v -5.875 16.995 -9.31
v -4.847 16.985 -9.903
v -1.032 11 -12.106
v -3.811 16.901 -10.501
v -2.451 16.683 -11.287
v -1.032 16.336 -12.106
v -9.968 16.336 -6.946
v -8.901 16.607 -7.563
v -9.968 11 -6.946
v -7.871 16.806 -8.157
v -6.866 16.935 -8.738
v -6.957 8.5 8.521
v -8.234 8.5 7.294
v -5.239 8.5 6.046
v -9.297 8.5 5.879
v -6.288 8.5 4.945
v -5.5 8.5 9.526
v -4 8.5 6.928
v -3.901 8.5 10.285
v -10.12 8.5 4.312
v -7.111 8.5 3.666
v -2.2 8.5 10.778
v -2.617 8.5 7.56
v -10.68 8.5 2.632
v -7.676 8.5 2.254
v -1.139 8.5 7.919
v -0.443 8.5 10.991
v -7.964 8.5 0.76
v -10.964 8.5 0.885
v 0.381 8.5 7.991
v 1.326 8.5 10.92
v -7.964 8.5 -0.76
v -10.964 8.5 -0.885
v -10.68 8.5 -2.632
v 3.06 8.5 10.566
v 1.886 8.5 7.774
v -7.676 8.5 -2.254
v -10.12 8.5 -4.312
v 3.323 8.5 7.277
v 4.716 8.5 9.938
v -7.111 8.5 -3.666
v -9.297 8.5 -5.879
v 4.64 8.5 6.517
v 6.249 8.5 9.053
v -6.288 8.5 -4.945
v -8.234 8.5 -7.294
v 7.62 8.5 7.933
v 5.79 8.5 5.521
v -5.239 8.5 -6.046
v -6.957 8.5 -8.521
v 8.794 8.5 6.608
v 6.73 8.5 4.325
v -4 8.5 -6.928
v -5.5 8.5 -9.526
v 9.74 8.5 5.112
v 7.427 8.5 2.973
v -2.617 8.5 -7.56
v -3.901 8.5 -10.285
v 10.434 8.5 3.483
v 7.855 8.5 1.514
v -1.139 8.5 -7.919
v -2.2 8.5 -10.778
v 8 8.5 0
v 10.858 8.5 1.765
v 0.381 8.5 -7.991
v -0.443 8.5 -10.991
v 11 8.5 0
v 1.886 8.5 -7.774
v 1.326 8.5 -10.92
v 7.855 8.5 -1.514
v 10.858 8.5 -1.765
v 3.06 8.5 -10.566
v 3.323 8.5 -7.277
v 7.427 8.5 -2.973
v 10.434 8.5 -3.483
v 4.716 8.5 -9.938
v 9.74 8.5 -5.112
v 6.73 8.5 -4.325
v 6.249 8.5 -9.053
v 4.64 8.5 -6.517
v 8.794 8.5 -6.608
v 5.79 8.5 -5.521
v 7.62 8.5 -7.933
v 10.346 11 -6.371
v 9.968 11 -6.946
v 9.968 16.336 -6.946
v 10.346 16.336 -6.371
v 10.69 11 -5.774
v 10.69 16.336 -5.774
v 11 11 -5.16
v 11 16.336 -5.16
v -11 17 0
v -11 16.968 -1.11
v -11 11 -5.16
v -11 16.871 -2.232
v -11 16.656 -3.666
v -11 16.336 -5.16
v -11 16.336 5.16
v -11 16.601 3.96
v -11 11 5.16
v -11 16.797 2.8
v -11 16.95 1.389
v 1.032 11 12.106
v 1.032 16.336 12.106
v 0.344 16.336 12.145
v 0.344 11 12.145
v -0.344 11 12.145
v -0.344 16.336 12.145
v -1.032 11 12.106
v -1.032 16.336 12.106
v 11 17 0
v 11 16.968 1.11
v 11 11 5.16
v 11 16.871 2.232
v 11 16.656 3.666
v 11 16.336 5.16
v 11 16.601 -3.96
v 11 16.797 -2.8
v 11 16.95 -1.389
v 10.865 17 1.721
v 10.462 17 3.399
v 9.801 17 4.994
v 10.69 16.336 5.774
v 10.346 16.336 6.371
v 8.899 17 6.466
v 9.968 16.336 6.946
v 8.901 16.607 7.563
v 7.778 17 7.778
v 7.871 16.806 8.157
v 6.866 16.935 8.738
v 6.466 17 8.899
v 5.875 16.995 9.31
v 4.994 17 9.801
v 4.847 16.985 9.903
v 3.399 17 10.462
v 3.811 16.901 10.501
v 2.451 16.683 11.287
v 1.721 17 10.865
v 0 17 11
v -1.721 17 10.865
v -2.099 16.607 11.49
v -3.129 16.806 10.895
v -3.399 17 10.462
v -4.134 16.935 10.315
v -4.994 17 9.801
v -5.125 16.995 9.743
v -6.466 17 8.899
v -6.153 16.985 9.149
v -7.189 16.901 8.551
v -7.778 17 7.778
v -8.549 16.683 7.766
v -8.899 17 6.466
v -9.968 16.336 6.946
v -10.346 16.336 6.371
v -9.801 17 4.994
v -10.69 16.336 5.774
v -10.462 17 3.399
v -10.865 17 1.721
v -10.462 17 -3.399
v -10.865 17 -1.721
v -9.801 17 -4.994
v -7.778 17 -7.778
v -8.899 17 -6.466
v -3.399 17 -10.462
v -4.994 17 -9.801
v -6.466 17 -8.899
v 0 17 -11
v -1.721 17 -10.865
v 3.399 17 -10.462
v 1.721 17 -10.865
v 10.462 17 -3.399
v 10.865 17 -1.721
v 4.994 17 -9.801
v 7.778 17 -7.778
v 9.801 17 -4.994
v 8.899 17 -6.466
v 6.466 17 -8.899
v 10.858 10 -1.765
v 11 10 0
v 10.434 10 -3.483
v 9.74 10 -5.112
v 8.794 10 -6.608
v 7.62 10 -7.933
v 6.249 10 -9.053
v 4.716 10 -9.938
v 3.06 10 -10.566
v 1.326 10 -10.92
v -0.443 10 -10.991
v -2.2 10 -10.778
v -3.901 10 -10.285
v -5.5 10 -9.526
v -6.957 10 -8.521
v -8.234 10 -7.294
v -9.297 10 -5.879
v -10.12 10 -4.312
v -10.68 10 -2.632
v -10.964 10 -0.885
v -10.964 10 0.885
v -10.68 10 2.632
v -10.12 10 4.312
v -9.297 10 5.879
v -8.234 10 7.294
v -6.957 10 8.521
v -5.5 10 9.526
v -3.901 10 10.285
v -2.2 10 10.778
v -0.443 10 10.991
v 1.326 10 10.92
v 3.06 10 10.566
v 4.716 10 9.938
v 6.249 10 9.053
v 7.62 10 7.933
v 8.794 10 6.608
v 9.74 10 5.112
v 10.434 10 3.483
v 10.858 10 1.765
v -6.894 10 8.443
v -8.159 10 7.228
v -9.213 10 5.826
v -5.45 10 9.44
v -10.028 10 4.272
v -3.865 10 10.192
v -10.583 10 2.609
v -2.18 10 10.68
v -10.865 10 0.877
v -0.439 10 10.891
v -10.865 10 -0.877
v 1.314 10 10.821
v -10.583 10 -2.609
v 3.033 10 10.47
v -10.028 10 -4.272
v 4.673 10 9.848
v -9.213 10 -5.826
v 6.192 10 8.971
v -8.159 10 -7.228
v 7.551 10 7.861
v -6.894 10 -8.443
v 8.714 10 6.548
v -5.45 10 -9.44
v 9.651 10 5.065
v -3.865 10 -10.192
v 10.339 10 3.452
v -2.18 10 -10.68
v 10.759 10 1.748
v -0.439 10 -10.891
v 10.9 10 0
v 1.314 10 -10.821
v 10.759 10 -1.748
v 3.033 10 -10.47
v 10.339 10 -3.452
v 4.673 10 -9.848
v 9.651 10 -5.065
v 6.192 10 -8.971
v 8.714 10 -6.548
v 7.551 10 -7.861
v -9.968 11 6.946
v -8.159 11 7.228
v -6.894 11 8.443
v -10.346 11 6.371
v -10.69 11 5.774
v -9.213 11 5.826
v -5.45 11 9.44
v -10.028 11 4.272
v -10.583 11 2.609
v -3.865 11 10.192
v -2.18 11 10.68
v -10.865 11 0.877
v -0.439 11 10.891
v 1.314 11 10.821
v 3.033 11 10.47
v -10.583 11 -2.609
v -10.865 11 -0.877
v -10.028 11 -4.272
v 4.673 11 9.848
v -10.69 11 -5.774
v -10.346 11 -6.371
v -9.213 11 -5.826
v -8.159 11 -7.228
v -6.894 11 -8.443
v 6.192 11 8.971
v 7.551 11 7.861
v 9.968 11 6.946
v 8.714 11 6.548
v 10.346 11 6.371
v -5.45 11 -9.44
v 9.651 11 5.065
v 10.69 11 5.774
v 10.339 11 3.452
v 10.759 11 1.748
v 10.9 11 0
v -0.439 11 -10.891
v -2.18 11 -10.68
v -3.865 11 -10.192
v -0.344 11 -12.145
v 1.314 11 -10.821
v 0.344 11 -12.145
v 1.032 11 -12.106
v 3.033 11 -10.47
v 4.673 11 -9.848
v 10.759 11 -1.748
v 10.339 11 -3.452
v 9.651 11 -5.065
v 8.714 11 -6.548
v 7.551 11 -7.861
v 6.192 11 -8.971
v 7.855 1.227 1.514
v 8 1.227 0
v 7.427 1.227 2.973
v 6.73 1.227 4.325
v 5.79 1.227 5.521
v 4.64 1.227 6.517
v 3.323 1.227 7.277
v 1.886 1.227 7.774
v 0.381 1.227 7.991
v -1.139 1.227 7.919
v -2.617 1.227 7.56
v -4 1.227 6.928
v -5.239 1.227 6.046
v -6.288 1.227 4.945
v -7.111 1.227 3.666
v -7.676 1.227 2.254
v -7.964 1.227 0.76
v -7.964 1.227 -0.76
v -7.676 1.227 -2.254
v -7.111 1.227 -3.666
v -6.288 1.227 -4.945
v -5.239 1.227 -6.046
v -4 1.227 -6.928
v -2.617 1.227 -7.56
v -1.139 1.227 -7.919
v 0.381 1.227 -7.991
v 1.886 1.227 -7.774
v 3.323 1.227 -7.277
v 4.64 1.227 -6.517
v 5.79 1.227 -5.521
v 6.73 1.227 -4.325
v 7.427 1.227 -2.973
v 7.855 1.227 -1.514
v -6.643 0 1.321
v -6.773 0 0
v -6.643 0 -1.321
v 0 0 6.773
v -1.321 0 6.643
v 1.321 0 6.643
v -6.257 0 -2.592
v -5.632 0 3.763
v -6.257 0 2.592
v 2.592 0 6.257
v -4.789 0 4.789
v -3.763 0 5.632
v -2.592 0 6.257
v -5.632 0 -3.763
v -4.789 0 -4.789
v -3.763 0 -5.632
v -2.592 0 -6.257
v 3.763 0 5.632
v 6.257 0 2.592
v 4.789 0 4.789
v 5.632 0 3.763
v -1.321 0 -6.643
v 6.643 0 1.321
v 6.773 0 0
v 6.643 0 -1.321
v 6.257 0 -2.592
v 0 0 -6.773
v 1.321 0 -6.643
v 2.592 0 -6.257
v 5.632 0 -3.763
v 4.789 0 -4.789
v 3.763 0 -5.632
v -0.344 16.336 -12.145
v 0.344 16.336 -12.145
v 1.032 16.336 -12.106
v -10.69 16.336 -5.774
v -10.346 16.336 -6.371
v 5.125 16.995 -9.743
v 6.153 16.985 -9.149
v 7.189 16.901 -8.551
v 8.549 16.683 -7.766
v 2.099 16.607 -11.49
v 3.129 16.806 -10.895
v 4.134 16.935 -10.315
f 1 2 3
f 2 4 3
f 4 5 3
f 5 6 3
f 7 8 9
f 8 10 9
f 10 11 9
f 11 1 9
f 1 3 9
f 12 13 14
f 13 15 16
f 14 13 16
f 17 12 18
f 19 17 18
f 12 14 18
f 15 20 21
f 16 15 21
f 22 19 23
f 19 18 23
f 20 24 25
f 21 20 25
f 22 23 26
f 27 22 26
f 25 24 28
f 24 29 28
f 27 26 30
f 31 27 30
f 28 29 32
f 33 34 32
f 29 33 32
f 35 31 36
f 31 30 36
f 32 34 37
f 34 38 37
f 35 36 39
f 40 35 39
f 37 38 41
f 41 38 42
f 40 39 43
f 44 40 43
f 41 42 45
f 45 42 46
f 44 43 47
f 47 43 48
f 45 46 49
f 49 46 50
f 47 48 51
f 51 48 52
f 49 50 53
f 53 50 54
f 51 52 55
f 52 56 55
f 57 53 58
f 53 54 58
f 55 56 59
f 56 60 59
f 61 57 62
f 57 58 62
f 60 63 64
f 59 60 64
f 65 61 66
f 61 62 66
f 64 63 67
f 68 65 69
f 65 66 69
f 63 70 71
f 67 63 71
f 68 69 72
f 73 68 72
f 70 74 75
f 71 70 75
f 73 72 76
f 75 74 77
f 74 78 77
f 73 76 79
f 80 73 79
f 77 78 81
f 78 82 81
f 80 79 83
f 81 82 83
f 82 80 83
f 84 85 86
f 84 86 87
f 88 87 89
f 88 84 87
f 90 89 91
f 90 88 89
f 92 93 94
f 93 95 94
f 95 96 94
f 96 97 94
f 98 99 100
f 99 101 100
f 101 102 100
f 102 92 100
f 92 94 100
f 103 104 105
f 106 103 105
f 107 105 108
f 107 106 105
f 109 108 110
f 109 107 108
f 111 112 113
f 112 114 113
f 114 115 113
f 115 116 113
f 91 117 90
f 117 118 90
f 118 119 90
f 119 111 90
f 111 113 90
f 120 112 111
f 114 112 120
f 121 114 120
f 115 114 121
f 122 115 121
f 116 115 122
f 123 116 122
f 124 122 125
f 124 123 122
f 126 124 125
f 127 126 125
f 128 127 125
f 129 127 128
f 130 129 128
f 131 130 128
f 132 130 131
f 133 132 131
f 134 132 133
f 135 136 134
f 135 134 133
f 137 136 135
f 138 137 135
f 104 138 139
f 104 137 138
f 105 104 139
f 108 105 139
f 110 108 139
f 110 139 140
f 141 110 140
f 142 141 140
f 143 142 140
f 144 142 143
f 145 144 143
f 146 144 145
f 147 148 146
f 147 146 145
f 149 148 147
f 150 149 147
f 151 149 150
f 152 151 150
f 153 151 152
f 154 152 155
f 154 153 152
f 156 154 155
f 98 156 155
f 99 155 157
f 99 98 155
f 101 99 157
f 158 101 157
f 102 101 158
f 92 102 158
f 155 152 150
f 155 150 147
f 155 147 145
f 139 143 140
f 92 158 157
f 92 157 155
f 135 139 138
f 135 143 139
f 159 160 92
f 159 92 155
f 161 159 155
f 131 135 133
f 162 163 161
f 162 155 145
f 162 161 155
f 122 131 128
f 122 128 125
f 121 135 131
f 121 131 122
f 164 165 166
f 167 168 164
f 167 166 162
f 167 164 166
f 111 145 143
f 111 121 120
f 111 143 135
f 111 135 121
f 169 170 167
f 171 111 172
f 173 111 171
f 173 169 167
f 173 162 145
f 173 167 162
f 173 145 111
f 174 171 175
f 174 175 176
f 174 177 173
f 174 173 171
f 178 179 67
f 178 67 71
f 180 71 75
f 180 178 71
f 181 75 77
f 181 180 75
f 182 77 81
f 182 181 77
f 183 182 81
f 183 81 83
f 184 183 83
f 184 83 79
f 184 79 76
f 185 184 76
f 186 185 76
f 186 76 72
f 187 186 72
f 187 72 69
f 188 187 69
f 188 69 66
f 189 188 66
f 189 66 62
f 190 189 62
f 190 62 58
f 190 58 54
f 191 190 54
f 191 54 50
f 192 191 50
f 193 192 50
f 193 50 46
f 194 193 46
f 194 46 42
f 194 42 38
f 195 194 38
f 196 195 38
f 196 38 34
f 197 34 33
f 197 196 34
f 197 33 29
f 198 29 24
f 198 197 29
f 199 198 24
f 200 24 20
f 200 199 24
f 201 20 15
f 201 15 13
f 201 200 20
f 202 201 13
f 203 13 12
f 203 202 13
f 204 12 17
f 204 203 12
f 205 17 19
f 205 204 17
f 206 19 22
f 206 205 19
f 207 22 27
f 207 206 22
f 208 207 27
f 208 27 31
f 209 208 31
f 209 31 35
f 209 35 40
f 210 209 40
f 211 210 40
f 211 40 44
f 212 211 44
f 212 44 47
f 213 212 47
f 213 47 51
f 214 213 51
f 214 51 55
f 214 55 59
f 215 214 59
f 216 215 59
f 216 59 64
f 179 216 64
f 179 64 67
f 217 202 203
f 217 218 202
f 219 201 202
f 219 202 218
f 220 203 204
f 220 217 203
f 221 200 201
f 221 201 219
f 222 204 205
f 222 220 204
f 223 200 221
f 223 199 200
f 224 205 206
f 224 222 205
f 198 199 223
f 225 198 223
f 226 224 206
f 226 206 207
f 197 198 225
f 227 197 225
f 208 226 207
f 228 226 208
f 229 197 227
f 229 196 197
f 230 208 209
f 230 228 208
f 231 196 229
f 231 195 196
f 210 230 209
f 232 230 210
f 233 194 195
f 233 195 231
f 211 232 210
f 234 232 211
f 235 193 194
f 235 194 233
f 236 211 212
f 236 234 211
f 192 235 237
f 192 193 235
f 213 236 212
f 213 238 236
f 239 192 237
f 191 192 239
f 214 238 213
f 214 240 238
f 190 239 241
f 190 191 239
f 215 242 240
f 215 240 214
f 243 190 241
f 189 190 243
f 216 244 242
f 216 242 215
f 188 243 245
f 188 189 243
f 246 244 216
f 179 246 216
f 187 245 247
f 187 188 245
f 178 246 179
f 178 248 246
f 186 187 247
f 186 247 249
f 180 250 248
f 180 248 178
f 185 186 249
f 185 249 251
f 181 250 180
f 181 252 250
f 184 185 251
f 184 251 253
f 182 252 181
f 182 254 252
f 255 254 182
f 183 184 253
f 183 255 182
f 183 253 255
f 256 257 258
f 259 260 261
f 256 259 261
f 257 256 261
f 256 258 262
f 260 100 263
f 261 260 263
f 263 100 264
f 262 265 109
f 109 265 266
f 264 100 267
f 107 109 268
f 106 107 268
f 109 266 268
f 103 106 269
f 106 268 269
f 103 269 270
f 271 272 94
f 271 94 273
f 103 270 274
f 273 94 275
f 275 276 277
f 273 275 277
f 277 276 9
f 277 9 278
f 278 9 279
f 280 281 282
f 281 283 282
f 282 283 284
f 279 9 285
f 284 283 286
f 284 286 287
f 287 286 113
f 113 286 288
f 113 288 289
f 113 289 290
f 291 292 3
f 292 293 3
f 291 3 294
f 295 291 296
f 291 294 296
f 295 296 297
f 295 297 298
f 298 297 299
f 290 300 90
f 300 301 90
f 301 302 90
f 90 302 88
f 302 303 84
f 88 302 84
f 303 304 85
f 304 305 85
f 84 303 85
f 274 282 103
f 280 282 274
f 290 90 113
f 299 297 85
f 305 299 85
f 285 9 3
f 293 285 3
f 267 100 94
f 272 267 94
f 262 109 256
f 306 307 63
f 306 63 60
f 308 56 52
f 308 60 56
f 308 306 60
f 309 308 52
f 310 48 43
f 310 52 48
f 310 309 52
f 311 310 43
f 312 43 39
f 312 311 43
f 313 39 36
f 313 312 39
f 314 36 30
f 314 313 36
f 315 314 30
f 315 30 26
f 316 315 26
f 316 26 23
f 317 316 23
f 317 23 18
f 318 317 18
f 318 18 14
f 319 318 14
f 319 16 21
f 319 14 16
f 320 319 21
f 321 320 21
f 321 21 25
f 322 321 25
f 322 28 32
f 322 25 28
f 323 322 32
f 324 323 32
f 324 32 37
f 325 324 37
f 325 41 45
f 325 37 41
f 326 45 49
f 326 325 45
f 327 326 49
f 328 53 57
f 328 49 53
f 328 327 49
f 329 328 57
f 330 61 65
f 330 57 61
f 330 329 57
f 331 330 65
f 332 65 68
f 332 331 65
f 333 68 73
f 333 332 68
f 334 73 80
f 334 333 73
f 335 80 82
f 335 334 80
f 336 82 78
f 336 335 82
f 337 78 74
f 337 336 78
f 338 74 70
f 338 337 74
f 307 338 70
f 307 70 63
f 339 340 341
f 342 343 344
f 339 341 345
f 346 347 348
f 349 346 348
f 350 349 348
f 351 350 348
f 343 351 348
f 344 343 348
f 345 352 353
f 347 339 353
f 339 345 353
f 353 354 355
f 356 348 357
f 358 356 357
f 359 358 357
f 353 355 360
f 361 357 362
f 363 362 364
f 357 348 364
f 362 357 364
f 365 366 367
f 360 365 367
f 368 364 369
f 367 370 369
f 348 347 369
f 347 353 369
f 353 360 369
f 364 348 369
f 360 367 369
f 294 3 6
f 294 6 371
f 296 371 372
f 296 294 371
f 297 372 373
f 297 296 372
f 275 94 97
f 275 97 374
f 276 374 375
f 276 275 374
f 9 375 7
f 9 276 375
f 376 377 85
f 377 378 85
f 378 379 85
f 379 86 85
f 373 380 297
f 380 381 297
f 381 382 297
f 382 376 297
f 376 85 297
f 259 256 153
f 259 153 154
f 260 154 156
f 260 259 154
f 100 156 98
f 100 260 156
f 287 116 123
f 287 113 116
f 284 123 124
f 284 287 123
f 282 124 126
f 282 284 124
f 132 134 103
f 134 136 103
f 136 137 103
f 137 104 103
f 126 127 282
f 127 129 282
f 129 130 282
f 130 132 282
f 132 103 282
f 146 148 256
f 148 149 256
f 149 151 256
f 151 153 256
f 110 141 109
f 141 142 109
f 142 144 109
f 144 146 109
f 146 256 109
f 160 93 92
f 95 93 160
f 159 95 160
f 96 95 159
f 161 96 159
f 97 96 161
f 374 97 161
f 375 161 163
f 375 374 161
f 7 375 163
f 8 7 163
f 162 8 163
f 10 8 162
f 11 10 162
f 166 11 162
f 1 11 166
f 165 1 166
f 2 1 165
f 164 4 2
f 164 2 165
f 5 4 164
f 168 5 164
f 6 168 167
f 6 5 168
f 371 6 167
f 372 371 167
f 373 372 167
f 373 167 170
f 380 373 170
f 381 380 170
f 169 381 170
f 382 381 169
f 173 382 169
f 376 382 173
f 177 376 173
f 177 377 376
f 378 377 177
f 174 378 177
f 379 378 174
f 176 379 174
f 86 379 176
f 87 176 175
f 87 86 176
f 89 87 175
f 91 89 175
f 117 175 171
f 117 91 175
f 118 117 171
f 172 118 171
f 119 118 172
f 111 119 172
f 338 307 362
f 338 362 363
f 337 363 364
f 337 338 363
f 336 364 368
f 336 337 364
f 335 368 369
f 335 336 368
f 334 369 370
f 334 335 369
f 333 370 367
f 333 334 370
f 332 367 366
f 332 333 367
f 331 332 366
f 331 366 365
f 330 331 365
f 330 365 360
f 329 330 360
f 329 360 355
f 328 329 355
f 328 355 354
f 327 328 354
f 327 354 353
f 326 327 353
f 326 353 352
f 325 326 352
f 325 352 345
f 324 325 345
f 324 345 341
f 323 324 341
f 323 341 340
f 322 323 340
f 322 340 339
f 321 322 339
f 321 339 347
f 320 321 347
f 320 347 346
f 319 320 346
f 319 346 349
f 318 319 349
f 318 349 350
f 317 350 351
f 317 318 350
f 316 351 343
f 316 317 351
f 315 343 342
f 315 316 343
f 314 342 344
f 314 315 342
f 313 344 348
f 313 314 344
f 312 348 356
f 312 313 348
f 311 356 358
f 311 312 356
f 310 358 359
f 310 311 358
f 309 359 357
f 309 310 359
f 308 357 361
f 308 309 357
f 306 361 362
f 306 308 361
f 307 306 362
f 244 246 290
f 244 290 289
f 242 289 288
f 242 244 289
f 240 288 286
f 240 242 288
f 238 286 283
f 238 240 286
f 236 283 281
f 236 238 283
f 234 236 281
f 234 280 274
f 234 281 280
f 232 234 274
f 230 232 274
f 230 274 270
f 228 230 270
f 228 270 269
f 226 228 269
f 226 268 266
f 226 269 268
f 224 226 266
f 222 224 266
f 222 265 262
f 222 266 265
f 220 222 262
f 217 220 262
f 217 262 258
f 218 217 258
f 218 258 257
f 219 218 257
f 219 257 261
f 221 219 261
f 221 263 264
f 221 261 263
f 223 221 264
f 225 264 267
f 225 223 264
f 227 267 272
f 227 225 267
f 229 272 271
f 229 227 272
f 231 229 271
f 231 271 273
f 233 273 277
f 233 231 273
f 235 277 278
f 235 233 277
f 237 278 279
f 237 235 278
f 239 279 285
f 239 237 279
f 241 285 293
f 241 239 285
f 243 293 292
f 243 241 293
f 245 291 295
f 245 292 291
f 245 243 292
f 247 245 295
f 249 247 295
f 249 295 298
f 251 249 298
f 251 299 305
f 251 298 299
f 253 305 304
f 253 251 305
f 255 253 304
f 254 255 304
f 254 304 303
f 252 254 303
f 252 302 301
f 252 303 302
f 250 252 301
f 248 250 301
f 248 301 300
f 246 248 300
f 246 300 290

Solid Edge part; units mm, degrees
sketch "Sketch1" plane through (0, 0, 0) normal (0, 0, 1) x (1, 0, 0)
  line L0 (0, 17) -> (11, 17)
  line L1 (11, 17) -> (12.15, 16.336)
  line L2 (12.15, 16.336) -> (12.15, 11)
  line L3 (12.15, 11) -> (10.9, 11)
  line L4 (10.9, 11) -> (10.9, 10)
  line L5 (10.9, 10) -> (8, 10)
  line L6 (8, 10) -> (8, 1.227)
  line L7 (8, 1.227) -> (6.773, 0)
  line L8 (6.773, 0) -> (0, 0)
  line L9 (0, 0) -> (0, 17)
revolve "RevolvedProtrusion1" add sketch "Sketch1" angle 360 about axis through (0, 0, 0) along (0, 1, 0)
cosmetic_thread "Thread1" size "M16"
sketch "Sketch2" plane through (0, 10, 0) normal (0, -1, 0) x (1, 0, 0)
  circle A0 centre (0, 0) radius 27
  line L0 (-11, 6.3509) -> (0, 12.7017)
  line L1 (0, 12.7017) -> (11, 6.3509)
  line L2 (11, 6.3509) -> (11, -6.3509)
  line L3 (11, -6.3509) -> (0, -12.7017)
  line L4 (0, -12.7017) -> (-11, -6.3509)
  line L5 (-11, -6.3509) -> (-11, 6.3509)
extrude "ExtrudedCutout_1" cut sketch "Sketch2" against normal blind 7
sketch "Sketch3" plane through (0, 0, 0) normal (0, 0, 1) x (1, 0, 0)
  line L0 (8, 8.5) -> (11, 8.5)
  line L1 (11, 8.5) -> (11, 10)
  line L2 (11, 10) -> (8, 10)
  line L3 (8, 10) -> (8, 8.5)
revolve "RevolvedProtrusion2" add sketch "Sketch3" angle 360 about axis through (0, 8.5, 0) along (0, 1, 0)
properties part number "28027-221615"
